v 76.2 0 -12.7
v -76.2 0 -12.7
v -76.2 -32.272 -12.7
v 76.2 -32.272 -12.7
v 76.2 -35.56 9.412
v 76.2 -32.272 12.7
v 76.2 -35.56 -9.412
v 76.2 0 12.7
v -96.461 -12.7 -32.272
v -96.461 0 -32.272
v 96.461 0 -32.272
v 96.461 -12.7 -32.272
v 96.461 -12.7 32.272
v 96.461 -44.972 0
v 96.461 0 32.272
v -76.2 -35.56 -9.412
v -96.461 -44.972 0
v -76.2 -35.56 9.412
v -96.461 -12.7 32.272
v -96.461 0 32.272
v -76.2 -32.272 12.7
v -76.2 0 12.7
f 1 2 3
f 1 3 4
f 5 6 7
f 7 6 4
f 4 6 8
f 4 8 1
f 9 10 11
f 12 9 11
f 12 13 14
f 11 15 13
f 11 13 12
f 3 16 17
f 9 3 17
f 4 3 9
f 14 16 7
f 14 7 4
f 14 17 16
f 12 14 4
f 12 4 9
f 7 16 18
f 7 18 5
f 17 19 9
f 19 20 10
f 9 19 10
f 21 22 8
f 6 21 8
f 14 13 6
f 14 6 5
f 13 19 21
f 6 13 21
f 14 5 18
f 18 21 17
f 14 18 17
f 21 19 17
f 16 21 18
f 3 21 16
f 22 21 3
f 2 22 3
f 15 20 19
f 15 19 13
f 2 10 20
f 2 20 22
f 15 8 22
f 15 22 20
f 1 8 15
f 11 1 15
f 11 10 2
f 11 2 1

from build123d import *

# Parameters (mm, degrees)
SKETCH1_W           = 192.921126566
SKETCH1_H           = 64.543351392
SKETCH1_W_2         = 152.4
SKETCH1_H_2         = 25.4
BOSS_EXTRUDE4_DEPTH = 50.8
CHAMFER2_SIZE       = 38.1
SKETCH1_5_W         = 152.4
SKETCH1_5_H         = 25.4
CUT_EXTRUDE1_DEPTH  = 35.56


with BuildPart() as part:
    # Sketch1 → Boss-Extrude4 (new body)
    # profile 1 of 2: a face of its own
    with BuildSketch(Plane(origin=(0, 0, 0), x_dir=(1, 0, 0), z_dir=(0, 1, 0))):
        Rectangle(SKETCH1_W, SKETCH1_H)
        Rectangle(SKETCH1_W_2, SKETCH1_H_2, mode=Mode.SUBTRACT)
    # profile 2 of 2: a face of its own
    with BuildSketch(Plane(origin=(0, 0, 0), x_dir=(1, 0, 0), z_dir=(0, 1, 0))):
        Rectangle(SKETCH1_W_2, SKETCH1_H_2)
    extrude(amount=-BOSS_EXTRUDE4_DEPTH)

    # Chamfer2
    # the kernel refuses this chamfer: 38.1 mm, written as the material it takes off along each edge
    with BuildSketch(Plane(origin=(-194.441685124, -50.8, 32.271675696), x_dir=(0, 0.9996219169112968, 0.02749587661058638), z_dir=(1, 0, 0))) as chamfer2_piece_1:
        Polygon((CHAMFER2_SIZE * 0.999621916911, -CHAMFER2_SIZE * 0.0274958766106), (-CHAMFER2_SIZE * 0.0274958766106, -CHAMFER2_SIZE * 0.999621916911), (0, 0), align=None)
    extrude(amount=388.883370249, mode=Mode.SUBTRACT)
    with BuildSketch(Plane(origin=(194.441685124, -50.8, -32.271675696), x_dir=(0, -0.02749587661058638, 0.9996219169112968), z_dir=(-1, 0, 0))) as chamfer2_piece_2:
        Polygon((CHAMFER2_SIZE * 0.999621916911, CHAMFER2_SIZE * 0.0274958766106), (-CHAMFER2_SIZE * 0.0274958766106, CHAMFER2_SIZE * 0.999621916911), (0, 0), align=None)
    extrude(amount=388.883370249, mode=Mode.SUBTRACT)

    # Sketch1<5> → Cut-Extrude1 (cut)
    with BuildSketch(Plane(origin=(0, 0, 0), x_dir=(1, 0, 0), z_dir=(0, 1, 0))):
        Rectangle(SKETCH1_5_W, SKETCH1_5_H)
    extrude(amount=-CUT_EXTRUDE1_DEPTH, mode=Mode.SUBTRACT)


solid = part.part
